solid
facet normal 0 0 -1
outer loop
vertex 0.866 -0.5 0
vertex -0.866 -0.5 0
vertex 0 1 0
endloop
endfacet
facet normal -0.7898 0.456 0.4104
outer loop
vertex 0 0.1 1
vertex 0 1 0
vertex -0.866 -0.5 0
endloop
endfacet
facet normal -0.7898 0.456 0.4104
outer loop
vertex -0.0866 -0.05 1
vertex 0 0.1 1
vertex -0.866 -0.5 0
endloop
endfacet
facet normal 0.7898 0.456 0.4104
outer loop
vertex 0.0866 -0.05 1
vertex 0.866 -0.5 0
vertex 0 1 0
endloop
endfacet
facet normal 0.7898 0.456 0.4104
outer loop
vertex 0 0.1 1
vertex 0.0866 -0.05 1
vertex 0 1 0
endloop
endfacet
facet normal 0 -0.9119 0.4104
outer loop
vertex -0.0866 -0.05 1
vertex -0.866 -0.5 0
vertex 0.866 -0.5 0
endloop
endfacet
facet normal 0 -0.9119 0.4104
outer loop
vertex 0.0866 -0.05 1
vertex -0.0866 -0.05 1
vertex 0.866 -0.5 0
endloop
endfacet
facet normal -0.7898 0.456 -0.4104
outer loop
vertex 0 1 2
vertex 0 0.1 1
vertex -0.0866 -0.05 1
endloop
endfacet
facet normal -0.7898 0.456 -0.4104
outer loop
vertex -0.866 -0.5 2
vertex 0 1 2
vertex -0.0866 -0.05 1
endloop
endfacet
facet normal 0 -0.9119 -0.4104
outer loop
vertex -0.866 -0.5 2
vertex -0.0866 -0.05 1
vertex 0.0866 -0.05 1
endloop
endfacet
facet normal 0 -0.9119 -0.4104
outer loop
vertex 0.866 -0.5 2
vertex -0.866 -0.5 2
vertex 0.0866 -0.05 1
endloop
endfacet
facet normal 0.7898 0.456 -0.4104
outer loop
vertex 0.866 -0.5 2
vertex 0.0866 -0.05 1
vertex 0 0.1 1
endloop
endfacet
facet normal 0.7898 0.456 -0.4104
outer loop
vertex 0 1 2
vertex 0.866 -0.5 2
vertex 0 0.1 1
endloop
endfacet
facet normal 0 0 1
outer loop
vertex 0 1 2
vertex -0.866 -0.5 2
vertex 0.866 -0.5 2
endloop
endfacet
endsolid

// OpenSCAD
h = 1;

polyhedron(
  points=[
    [0,1,0],
    [cos(210), sin(210),0],
    [cos(330), sin(330),0],

    [0,0.1,h],
    [0.1*cos(210), 0.1*sin(210),h],
    [0.1*cos(330), 0.1*sin(330),h],

    [0,1,2*h],
    [cos(210), sin(210),2*h],
    [cos(330), sin(330),2*h],
  ],
  faces=[
    [0,1,2],
    [1,0,3],[1,3,4],
    [0,2,5],[0,5,3],
    [2,1,4],[2,4,5],

    [4,3,6],[4,6,7],
    [5,4,7],[5,7,8],
    [3,5,8],[3,8,6],
    [8,7,6],
  ]);
